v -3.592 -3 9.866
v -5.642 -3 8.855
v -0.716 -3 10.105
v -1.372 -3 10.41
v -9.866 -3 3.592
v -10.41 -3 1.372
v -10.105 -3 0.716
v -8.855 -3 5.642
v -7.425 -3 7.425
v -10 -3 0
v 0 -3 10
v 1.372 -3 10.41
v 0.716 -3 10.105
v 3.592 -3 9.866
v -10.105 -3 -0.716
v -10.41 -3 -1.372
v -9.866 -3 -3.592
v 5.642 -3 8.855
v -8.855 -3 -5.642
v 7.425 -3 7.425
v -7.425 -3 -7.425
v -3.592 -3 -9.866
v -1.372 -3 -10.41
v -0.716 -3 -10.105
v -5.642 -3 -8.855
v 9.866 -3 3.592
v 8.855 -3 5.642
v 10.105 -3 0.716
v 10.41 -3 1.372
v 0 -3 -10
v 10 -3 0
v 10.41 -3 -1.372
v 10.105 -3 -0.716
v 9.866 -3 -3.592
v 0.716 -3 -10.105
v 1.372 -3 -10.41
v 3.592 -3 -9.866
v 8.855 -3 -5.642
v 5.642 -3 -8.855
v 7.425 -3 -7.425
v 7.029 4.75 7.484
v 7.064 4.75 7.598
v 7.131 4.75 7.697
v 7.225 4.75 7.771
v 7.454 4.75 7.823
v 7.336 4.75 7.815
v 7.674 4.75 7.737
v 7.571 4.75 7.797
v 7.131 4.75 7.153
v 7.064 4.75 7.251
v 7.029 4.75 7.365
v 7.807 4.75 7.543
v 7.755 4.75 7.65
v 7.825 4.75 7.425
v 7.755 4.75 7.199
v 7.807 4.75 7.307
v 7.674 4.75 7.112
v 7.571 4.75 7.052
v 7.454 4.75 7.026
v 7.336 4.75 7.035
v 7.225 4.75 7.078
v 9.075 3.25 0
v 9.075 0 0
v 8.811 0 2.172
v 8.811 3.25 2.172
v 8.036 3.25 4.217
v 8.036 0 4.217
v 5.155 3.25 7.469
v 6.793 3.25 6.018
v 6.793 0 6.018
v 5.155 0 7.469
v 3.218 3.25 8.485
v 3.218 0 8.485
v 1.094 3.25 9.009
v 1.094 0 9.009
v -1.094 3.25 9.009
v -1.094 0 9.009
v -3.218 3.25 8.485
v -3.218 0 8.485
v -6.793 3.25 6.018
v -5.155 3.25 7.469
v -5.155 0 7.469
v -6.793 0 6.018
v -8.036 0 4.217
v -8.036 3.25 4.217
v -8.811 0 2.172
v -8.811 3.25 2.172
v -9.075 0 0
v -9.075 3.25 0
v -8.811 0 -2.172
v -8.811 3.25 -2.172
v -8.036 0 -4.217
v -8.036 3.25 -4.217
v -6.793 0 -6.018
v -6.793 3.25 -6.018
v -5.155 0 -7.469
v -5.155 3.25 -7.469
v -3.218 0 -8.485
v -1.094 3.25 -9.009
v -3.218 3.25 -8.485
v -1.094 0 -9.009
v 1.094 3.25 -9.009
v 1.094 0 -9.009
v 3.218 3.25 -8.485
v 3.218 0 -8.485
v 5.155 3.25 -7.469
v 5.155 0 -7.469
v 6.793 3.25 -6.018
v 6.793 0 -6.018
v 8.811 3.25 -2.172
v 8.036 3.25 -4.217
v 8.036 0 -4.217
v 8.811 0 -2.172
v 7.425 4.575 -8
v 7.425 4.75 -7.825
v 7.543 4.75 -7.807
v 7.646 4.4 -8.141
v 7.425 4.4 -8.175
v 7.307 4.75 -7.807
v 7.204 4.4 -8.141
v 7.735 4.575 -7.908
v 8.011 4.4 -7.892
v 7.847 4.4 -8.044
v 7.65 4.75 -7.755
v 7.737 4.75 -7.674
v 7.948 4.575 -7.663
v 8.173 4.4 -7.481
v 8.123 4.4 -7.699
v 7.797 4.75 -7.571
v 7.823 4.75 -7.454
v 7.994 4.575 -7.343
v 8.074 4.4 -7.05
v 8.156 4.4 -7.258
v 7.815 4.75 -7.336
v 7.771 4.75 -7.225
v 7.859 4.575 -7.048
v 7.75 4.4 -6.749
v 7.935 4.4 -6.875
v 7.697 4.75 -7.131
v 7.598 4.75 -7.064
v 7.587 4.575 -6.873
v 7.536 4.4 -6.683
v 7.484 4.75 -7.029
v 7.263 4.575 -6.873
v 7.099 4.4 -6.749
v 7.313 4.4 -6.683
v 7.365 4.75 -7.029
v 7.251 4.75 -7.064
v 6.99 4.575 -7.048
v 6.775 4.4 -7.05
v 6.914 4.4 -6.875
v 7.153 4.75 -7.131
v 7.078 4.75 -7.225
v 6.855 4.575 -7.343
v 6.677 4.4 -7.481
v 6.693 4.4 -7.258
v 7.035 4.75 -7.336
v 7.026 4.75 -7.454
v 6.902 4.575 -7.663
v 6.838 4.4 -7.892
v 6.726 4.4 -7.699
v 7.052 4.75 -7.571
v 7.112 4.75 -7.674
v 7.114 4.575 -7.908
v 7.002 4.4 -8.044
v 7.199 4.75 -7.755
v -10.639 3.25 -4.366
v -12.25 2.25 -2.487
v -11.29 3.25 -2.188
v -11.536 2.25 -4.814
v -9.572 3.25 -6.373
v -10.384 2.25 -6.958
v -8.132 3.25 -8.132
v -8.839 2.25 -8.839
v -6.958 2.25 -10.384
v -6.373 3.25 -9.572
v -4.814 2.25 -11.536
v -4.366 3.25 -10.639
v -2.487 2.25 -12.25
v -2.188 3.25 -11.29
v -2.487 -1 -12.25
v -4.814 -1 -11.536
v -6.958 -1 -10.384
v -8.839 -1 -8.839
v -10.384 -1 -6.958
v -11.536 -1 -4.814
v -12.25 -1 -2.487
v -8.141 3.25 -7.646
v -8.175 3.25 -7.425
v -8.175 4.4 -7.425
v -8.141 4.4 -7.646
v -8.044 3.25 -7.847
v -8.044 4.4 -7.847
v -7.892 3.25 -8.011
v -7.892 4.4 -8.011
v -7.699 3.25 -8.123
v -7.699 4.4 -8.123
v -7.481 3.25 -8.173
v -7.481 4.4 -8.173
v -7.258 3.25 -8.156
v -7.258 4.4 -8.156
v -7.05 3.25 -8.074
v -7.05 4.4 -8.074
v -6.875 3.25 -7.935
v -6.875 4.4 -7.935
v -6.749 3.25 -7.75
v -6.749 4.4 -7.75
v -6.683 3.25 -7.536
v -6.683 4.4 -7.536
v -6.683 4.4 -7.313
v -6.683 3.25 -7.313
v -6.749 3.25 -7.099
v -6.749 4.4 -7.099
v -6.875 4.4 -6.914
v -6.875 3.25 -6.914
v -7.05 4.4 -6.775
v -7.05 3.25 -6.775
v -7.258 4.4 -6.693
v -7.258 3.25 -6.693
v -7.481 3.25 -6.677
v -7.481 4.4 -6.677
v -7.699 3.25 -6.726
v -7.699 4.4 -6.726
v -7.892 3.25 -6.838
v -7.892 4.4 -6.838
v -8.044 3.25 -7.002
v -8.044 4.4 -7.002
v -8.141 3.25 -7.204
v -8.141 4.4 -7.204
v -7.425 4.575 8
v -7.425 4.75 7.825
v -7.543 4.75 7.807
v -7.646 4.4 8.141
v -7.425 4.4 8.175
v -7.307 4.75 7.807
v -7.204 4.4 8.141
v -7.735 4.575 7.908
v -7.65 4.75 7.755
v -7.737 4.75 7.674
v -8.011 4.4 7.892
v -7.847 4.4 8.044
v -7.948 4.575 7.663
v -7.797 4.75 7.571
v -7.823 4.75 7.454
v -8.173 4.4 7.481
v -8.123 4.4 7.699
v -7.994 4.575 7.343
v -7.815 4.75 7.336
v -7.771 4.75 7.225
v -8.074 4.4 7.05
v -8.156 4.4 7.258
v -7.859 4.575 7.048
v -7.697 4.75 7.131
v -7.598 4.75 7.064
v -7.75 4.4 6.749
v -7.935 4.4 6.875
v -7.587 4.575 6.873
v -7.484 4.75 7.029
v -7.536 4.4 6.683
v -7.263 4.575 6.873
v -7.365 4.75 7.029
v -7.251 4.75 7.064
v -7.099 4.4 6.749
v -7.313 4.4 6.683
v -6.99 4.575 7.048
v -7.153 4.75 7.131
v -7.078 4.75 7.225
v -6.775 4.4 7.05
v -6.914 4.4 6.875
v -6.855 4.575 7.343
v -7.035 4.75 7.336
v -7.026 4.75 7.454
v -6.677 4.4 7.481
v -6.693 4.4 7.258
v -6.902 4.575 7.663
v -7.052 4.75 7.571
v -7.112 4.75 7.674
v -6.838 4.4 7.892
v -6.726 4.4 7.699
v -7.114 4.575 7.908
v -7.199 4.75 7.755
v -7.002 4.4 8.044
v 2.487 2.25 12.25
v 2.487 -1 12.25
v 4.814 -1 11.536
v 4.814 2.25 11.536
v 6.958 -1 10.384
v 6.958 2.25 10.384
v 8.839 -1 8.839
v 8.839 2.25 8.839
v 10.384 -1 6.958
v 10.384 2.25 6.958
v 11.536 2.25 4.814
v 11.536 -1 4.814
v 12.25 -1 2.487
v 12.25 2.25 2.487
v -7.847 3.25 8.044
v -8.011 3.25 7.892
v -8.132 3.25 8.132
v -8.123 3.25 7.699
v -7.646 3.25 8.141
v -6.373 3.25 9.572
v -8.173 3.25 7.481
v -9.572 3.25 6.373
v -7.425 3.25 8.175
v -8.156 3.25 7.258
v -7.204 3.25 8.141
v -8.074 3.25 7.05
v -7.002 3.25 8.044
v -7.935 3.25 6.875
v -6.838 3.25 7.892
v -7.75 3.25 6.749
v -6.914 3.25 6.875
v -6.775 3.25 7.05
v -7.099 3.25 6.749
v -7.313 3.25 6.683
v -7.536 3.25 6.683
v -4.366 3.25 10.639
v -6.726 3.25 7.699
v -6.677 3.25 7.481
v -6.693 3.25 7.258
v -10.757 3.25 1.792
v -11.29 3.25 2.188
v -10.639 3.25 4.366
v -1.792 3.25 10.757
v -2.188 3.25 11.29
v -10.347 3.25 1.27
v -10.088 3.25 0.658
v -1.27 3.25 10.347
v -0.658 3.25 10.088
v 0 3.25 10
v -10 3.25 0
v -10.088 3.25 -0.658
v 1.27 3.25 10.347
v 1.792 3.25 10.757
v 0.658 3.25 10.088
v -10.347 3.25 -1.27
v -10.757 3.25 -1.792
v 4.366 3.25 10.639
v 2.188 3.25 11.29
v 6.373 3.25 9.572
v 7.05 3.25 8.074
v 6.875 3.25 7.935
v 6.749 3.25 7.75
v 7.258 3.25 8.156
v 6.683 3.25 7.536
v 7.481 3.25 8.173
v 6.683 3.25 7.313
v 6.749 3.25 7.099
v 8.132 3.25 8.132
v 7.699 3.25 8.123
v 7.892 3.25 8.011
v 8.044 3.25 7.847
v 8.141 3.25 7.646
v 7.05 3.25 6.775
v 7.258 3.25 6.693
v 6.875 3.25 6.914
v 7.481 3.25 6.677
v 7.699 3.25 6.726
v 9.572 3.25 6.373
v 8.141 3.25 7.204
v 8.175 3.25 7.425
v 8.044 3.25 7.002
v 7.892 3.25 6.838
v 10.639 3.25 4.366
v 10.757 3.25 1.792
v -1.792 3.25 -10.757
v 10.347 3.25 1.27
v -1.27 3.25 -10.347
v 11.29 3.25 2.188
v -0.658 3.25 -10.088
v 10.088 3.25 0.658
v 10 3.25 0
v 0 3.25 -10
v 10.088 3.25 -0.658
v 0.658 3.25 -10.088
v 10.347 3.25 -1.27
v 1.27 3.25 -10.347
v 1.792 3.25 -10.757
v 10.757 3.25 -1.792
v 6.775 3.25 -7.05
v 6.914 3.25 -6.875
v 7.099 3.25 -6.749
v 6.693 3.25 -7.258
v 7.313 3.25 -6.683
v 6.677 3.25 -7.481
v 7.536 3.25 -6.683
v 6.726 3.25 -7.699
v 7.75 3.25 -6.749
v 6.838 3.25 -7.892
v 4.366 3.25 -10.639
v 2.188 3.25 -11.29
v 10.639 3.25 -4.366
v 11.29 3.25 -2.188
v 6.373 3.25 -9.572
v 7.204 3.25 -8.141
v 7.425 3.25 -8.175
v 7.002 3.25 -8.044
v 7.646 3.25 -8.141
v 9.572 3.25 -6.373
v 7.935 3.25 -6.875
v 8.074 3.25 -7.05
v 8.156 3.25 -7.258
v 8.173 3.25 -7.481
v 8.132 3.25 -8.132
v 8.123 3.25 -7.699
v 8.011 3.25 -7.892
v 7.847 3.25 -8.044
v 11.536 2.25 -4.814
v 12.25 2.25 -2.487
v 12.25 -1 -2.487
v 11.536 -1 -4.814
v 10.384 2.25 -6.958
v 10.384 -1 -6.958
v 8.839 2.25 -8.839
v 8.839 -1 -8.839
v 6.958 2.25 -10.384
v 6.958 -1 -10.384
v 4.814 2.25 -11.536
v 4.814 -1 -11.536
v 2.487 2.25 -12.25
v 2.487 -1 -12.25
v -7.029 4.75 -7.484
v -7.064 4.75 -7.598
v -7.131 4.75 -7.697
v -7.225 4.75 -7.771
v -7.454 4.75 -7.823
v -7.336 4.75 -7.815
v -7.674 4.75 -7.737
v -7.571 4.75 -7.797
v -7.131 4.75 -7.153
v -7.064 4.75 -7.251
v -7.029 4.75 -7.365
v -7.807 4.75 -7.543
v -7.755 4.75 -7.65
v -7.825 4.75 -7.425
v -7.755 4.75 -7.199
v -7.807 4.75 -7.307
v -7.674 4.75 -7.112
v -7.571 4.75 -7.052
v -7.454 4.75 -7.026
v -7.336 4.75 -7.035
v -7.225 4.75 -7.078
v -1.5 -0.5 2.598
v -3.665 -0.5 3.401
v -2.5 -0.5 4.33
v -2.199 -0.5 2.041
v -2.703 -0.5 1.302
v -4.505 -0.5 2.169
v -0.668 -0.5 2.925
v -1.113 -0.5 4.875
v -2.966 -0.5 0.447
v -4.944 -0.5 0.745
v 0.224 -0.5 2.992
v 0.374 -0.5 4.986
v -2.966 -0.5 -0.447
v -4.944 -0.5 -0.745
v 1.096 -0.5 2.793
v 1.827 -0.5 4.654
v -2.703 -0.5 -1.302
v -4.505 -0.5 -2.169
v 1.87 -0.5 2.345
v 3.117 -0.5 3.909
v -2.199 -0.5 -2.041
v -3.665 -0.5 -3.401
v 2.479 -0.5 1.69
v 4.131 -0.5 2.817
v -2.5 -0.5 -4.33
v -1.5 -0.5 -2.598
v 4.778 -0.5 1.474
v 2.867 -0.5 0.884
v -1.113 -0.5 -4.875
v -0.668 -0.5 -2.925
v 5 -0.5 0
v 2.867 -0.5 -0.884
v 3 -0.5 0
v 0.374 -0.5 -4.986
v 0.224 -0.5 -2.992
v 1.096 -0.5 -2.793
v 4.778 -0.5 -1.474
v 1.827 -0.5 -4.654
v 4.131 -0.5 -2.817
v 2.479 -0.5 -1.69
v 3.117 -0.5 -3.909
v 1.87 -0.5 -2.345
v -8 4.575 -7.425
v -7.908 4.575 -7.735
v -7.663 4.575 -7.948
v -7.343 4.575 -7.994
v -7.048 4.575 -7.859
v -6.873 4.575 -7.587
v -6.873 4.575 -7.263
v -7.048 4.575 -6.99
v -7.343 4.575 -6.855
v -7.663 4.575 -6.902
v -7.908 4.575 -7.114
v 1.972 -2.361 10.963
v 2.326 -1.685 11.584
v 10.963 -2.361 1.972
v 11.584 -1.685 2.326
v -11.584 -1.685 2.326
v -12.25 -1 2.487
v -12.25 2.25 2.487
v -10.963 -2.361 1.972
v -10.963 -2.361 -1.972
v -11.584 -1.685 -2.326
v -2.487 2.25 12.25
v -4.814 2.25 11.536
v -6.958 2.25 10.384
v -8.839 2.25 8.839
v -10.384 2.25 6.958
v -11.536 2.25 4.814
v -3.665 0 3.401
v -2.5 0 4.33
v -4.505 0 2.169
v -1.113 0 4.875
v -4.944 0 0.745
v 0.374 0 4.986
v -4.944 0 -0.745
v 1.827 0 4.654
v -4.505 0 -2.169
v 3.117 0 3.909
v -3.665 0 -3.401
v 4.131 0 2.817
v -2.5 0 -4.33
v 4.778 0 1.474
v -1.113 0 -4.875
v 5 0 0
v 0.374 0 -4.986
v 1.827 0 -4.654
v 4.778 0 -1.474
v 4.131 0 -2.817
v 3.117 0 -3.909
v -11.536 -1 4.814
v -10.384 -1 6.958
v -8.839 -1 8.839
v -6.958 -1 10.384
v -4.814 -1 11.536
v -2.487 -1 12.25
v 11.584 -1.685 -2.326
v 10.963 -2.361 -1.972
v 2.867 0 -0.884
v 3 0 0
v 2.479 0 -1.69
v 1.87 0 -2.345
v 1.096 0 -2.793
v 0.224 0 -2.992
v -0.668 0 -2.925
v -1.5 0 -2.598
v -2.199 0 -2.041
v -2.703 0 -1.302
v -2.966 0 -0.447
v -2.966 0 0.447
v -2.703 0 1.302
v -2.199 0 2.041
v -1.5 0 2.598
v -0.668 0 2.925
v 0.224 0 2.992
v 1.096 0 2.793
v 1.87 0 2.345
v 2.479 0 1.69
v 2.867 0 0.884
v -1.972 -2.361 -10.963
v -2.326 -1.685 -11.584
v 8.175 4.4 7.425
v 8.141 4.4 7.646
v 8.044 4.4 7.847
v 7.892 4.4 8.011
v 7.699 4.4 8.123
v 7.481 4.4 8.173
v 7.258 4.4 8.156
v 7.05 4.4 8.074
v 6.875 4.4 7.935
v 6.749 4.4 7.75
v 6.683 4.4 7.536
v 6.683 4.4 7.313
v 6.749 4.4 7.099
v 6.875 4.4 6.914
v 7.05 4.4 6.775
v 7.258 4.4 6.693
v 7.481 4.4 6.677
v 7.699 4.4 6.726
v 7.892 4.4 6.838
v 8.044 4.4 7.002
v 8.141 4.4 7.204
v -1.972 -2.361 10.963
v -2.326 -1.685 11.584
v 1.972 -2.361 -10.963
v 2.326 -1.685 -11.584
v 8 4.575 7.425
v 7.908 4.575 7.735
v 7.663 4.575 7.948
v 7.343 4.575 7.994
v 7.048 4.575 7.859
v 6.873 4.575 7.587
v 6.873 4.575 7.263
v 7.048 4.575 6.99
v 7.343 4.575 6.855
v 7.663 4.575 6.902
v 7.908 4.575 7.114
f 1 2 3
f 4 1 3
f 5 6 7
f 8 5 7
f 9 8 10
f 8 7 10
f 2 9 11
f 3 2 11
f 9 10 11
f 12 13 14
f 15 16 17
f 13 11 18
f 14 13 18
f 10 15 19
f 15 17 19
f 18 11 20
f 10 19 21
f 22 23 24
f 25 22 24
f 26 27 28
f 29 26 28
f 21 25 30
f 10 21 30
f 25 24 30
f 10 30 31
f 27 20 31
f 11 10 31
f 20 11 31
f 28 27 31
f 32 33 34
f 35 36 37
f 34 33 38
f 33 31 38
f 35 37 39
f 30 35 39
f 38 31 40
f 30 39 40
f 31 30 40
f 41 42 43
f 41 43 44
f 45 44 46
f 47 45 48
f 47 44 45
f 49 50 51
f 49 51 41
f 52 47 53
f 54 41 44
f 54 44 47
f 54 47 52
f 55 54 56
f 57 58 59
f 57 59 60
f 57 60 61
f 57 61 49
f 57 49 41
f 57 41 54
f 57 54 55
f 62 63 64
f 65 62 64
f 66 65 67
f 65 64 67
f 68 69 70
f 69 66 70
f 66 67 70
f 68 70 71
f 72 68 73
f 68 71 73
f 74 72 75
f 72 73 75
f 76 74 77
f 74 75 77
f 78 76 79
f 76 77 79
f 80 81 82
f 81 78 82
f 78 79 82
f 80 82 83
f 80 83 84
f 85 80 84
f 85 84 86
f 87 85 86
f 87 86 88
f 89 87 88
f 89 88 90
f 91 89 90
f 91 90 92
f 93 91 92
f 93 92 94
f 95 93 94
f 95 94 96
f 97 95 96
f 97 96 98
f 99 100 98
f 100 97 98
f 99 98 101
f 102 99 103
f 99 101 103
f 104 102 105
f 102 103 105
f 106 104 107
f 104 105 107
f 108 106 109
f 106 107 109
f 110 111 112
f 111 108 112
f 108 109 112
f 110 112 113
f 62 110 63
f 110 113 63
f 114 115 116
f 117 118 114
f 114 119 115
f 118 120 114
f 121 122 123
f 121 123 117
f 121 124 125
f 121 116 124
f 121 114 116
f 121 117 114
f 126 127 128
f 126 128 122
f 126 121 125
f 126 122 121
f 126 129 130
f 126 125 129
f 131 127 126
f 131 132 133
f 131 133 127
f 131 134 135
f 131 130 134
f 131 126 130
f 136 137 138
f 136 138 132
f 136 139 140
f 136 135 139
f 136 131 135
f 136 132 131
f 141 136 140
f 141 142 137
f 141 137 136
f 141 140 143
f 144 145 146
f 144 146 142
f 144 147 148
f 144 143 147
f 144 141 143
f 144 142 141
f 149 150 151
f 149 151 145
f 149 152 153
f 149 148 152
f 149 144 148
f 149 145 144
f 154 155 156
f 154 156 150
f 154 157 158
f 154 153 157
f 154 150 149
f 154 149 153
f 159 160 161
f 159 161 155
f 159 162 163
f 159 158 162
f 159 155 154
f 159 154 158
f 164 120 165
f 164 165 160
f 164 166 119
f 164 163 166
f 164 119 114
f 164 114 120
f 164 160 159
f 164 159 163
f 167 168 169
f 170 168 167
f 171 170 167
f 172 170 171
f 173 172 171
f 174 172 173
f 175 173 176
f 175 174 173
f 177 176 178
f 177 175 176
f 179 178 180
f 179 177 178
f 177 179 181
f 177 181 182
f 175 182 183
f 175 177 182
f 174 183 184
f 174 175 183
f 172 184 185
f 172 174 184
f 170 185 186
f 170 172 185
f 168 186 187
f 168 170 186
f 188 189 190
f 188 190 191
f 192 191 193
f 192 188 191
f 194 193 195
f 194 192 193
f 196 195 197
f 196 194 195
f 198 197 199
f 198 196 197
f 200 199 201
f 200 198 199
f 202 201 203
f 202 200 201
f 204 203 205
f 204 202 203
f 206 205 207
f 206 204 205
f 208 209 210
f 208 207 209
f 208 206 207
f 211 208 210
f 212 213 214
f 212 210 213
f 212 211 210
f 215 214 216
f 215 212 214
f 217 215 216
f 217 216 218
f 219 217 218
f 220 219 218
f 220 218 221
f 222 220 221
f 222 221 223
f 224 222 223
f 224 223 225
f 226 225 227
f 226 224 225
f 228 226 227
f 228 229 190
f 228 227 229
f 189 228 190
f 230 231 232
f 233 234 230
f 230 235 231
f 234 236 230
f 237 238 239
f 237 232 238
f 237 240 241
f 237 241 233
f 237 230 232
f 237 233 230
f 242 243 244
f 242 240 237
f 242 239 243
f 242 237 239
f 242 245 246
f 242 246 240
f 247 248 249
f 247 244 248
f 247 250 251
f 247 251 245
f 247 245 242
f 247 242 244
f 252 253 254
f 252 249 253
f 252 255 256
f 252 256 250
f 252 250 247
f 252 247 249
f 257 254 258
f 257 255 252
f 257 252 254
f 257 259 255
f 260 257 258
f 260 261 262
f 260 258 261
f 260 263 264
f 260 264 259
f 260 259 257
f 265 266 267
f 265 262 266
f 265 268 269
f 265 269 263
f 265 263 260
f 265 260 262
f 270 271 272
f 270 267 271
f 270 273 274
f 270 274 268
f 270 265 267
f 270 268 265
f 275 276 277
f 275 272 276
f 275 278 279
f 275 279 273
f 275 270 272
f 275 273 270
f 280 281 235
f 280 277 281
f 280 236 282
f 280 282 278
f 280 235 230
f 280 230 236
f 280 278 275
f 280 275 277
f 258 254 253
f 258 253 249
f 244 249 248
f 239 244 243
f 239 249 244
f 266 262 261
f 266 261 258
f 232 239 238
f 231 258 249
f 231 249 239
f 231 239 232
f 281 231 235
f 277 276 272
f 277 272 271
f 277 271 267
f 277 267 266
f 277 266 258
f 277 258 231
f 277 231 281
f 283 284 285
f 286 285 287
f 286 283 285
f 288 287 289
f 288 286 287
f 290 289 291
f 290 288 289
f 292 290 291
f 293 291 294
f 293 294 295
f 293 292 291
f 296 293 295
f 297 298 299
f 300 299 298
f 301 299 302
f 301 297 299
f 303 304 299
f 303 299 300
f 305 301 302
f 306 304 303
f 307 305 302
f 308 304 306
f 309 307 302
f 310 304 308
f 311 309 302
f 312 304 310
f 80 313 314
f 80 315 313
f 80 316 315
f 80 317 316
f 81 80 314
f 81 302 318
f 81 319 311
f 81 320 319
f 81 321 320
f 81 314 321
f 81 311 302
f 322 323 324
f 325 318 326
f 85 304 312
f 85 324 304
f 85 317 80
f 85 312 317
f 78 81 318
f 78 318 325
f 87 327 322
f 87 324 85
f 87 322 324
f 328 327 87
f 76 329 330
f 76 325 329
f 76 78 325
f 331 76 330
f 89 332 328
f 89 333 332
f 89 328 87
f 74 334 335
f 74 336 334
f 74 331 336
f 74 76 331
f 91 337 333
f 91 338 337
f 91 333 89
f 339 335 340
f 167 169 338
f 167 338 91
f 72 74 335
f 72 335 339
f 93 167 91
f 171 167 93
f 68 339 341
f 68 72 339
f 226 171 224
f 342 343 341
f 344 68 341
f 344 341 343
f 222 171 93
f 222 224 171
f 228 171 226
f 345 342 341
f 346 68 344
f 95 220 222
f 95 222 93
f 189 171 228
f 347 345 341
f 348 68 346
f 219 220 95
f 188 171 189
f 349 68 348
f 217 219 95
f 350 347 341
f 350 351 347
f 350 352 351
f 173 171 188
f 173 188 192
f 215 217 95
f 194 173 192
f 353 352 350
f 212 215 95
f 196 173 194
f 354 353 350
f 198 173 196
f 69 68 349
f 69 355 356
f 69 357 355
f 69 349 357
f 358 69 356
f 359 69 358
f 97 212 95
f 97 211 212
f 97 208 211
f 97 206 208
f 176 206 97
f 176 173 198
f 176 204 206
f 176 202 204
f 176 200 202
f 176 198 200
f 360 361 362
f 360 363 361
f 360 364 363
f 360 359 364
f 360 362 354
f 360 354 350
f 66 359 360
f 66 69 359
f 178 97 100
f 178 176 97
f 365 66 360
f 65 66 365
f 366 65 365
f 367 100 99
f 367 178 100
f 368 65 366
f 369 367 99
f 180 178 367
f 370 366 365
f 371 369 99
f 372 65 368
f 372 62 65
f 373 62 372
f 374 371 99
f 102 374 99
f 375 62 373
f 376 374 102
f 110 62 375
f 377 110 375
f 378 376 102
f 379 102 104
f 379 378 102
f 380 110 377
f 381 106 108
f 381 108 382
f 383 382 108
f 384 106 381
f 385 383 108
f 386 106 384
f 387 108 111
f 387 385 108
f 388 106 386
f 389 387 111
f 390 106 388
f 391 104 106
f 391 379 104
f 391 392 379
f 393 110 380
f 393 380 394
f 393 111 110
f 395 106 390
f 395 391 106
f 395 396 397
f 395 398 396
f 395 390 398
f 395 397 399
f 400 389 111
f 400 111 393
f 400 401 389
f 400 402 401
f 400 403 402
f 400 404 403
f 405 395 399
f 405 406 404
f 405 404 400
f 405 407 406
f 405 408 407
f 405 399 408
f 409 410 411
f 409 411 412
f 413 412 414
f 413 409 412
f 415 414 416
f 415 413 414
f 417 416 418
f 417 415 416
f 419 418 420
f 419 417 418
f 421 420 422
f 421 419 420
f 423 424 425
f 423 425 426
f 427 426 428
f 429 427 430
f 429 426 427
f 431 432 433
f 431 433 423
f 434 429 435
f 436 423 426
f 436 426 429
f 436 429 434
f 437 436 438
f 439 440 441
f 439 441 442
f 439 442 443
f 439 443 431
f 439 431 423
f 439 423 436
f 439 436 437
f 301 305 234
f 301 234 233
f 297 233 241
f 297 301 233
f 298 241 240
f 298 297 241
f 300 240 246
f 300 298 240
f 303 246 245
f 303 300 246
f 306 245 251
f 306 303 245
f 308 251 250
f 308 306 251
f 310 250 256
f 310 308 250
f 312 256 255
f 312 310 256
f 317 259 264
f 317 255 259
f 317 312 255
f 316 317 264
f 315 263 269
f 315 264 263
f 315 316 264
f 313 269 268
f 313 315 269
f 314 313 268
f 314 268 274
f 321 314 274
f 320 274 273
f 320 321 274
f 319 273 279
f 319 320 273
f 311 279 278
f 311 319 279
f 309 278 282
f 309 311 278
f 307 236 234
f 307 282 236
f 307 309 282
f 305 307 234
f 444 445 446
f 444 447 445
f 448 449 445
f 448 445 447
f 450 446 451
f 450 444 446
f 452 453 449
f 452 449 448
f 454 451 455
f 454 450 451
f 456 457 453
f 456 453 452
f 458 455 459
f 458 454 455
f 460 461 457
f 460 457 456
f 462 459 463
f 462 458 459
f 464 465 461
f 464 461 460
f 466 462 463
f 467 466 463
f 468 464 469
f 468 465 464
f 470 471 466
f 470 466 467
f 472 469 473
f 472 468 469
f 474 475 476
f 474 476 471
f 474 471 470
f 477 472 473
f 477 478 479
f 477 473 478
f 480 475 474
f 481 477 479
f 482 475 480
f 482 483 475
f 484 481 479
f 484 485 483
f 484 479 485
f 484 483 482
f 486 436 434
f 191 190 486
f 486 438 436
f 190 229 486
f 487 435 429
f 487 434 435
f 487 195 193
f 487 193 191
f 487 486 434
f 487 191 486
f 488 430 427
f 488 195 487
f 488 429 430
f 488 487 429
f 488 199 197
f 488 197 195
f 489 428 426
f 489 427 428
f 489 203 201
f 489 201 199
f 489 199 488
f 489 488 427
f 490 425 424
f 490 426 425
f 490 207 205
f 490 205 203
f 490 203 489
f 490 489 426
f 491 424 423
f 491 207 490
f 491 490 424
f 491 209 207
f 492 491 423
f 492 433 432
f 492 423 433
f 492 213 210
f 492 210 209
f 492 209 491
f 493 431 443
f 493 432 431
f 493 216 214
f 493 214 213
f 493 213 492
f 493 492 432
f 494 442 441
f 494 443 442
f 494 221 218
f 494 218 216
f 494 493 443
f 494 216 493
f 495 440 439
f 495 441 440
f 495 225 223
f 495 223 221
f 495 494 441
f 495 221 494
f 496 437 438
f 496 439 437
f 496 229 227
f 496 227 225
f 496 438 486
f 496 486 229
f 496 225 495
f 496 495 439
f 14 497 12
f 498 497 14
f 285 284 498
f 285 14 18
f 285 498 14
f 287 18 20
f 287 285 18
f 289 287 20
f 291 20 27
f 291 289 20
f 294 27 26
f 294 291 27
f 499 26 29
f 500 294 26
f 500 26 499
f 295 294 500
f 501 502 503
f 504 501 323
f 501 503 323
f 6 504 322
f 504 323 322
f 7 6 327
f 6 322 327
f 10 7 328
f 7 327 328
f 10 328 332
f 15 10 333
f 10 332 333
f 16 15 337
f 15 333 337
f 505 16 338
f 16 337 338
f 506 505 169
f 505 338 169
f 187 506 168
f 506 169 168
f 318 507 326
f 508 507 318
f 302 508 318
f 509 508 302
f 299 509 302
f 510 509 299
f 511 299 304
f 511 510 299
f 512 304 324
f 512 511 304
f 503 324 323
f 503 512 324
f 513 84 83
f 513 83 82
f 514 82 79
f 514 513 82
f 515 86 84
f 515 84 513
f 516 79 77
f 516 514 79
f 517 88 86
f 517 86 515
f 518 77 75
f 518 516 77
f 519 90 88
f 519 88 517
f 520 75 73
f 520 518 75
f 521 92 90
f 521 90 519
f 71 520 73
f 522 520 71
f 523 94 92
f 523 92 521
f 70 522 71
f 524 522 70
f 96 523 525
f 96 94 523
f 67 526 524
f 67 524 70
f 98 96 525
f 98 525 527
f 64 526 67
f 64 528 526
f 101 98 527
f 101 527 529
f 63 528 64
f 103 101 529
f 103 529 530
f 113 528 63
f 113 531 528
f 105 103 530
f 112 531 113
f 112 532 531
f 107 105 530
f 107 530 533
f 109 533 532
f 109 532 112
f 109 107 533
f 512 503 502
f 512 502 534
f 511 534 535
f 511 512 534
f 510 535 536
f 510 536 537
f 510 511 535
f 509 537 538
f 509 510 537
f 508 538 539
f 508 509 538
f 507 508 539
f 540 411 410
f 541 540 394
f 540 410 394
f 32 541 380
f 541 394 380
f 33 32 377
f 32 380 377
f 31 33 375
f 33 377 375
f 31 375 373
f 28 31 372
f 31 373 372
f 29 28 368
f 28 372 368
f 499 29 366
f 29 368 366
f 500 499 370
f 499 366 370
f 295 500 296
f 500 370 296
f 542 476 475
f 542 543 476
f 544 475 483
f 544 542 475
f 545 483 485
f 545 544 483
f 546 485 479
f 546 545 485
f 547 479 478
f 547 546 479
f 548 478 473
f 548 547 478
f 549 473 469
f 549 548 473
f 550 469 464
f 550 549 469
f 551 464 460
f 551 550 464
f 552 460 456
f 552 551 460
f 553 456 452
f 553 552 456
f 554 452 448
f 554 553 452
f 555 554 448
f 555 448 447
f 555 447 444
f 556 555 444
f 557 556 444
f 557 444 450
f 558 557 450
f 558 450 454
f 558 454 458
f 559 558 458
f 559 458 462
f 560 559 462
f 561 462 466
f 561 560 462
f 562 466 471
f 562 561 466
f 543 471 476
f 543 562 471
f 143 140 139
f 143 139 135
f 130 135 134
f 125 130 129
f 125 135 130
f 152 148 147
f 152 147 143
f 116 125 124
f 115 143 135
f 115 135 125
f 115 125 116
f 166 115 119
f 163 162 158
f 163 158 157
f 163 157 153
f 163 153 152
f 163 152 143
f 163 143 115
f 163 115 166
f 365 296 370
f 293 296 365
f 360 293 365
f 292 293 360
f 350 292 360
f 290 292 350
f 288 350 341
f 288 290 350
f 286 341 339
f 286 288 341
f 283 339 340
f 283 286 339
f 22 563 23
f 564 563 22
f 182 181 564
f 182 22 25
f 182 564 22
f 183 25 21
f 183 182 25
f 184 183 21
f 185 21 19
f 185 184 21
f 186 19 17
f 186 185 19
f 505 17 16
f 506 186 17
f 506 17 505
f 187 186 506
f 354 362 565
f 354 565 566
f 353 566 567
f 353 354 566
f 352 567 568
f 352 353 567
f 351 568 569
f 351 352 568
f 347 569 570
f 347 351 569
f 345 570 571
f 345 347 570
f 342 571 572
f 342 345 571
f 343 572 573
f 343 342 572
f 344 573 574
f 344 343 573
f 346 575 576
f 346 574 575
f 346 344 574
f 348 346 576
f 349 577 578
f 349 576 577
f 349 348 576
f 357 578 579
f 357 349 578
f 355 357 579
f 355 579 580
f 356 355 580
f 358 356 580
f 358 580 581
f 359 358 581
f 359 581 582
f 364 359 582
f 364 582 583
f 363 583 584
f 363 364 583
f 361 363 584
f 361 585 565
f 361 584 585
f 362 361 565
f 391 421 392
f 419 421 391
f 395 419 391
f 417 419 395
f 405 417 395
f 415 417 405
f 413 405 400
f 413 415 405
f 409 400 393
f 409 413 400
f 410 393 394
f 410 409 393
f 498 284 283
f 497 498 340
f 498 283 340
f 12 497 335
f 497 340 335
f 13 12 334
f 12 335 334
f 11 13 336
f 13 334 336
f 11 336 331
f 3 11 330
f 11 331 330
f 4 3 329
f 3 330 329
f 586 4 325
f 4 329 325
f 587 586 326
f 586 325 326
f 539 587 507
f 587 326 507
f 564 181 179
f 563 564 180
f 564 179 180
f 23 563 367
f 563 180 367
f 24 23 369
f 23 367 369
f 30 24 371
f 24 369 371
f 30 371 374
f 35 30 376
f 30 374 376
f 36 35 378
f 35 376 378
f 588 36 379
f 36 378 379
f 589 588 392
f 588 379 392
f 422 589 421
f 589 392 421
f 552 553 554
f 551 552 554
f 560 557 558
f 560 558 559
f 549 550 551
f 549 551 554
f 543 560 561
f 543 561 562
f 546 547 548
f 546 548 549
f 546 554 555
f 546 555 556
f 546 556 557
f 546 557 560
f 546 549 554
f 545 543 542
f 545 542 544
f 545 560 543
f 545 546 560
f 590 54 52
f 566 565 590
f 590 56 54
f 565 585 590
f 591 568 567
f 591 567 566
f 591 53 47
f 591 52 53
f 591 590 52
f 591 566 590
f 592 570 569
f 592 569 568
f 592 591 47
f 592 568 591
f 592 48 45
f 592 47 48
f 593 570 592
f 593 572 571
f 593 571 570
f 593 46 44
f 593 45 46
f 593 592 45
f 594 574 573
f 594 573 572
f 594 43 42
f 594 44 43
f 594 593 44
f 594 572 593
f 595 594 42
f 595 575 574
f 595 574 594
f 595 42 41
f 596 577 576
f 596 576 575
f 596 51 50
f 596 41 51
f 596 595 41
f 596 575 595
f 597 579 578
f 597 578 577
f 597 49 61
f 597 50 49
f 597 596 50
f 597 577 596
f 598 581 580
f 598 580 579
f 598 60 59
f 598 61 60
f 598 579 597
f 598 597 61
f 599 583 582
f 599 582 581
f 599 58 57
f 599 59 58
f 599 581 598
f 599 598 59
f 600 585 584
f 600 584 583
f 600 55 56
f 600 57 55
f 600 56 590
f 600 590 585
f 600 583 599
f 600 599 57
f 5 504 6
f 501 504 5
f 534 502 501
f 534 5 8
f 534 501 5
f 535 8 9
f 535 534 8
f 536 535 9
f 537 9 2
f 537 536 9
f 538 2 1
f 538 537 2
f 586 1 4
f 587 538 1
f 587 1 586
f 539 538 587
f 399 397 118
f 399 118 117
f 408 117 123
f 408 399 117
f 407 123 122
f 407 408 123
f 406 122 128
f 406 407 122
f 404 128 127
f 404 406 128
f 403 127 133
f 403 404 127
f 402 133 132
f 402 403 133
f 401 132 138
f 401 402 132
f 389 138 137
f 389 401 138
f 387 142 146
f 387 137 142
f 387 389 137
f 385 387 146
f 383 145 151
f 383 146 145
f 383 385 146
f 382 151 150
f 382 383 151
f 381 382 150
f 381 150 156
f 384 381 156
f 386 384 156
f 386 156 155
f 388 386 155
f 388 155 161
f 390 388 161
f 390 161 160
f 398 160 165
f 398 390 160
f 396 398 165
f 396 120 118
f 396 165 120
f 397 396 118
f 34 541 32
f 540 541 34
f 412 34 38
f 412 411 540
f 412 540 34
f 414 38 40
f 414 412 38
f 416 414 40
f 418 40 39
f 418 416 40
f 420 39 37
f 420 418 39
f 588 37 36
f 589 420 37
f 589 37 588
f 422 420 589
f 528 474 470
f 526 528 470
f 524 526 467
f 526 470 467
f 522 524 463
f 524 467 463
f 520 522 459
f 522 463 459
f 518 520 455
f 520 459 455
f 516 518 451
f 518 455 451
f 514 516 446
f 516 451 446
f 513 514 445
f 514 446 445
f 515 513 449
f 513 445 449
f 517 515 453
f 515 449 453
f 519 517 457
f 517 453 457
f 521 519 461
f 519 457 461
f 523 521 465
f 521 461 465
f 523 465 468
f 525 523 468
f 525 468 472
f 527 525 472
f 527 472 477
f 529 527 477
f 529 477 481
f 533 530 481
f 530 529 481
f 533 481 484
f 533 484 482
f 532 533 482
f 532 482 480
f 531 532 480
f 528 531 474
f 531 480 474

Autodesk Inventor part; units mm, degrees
ref_plane "YZ Plane" through (0, 0, 0) normal (1, 0, 0) x (0, 1, 0)
ref_plane "XZ Plane" through (0, 0, 0) normal (0, 1, 0) x (-1, 0, 0)
ref_plane "XY Plane" through (0, 0, 0) normal (0, 0, 1) x (1, 0, 0)
sketch "Sketch1" plane through (0, 0, 0) normal (0, 0, 1) x (1, 0, 0)
  line L0 (0, 0) -> (0, 12.75) construction
  line L1 (0, 0) -> (13.9342, 0) construction
  line L2 (0, 0) -> (0, -3)
  line L3 (0, -3) -> (12.5, -3)
  line L4 (12.5, -3) -> (12.5, 3.25)
  line L5 (12.5, 3.25) -> (9.075, 3.25)
  line L6 (9.075, 3.25) -> (9.075, 0)
  line L7 (9.075, 0) -> (0, 0)
  line L8 (3, 0) -> (5, 0)
  line L9 (5, 0) -> (5, -0.5)
  line L10 (5, -0.5) -> (3, -0.5)
  line L11 (3, -0.5) -> (3, 0)
  dimension "d0" = 3
  dimension "d1" = 5
  dimension "d2" = 0.5
  dimension "d3" = 9.075
  dimension "d4" = 12.5
  dimension "d5" = 3.25
  dimension "d6" = 3
revolve "Revolution1" add sketch "Sketch1" angle 360 about axis through (0, 0, 0) along (0, 1, 0) contours L7 L11 L10 L9 L6 L5 L4 L3 L2
chamfer "Chamfer1" distance 2 angle 45 1 edges at (-12.5, -3, 0)
chamfer "Chamfer2" distance 1 angle 45 1 edges at (-12.5, 3.25, 0)
sketch "Sketch2" plane through (0, 3.25, 0) normal (0, 1, 0) x (1, 0, 0)
  circle A0 centre (0, 0) radius 12.5 projected
  circle A1 centre (0, 0) radius 12.5 projected
  circle A2 centre (0, -12.5) radius 2.5
  line L0 (0, 0) -> (0, -12.5) construction
  point P0 (2.4875, -12.25)
  point P1 (-2.4875, -12.25)
  dimension "d14" = 5
extrude "Extrusion1" cut sketch "Sketch2" against normal through all contours A2 A0 picked at (0, -11.6481)
pattern_circular "Circular Pattern1" count 4 over 360 about axis through (0, -10, 0) along (0, 1, 0) of "Extrusion1"
sketch "Sketch3" plane through (0, 3.25, 12.5) normal (0, 1, 0) x (1, 0, 0)
  line L0 (0, 12.5) -> (0, -7.7808) construction
  line L1 (0, 12.5) -> (13.1543, -0.6543) construction
  circle A0 centre (7.4246, 5.0754) radius 0.75
  dimension "d20" = 45
  dimension "d21" = 1.5
  dimension "d22" = 10.5
extrude "Extrusion2" add sketch "Sketch3" along normal blind 1.5
chamfer "Chamfer3" distance 0.35 angle 45 1 edges at (6.6746, 4.75, 7.4246)
pattern_circular "Circular Pattern2" count 4 over 360 about axis through (0, -10, 0) along (0, 1, 0) of "Extrusion2", "Chamfer3"
properties part number "cpd_1.9_p0_v12"
